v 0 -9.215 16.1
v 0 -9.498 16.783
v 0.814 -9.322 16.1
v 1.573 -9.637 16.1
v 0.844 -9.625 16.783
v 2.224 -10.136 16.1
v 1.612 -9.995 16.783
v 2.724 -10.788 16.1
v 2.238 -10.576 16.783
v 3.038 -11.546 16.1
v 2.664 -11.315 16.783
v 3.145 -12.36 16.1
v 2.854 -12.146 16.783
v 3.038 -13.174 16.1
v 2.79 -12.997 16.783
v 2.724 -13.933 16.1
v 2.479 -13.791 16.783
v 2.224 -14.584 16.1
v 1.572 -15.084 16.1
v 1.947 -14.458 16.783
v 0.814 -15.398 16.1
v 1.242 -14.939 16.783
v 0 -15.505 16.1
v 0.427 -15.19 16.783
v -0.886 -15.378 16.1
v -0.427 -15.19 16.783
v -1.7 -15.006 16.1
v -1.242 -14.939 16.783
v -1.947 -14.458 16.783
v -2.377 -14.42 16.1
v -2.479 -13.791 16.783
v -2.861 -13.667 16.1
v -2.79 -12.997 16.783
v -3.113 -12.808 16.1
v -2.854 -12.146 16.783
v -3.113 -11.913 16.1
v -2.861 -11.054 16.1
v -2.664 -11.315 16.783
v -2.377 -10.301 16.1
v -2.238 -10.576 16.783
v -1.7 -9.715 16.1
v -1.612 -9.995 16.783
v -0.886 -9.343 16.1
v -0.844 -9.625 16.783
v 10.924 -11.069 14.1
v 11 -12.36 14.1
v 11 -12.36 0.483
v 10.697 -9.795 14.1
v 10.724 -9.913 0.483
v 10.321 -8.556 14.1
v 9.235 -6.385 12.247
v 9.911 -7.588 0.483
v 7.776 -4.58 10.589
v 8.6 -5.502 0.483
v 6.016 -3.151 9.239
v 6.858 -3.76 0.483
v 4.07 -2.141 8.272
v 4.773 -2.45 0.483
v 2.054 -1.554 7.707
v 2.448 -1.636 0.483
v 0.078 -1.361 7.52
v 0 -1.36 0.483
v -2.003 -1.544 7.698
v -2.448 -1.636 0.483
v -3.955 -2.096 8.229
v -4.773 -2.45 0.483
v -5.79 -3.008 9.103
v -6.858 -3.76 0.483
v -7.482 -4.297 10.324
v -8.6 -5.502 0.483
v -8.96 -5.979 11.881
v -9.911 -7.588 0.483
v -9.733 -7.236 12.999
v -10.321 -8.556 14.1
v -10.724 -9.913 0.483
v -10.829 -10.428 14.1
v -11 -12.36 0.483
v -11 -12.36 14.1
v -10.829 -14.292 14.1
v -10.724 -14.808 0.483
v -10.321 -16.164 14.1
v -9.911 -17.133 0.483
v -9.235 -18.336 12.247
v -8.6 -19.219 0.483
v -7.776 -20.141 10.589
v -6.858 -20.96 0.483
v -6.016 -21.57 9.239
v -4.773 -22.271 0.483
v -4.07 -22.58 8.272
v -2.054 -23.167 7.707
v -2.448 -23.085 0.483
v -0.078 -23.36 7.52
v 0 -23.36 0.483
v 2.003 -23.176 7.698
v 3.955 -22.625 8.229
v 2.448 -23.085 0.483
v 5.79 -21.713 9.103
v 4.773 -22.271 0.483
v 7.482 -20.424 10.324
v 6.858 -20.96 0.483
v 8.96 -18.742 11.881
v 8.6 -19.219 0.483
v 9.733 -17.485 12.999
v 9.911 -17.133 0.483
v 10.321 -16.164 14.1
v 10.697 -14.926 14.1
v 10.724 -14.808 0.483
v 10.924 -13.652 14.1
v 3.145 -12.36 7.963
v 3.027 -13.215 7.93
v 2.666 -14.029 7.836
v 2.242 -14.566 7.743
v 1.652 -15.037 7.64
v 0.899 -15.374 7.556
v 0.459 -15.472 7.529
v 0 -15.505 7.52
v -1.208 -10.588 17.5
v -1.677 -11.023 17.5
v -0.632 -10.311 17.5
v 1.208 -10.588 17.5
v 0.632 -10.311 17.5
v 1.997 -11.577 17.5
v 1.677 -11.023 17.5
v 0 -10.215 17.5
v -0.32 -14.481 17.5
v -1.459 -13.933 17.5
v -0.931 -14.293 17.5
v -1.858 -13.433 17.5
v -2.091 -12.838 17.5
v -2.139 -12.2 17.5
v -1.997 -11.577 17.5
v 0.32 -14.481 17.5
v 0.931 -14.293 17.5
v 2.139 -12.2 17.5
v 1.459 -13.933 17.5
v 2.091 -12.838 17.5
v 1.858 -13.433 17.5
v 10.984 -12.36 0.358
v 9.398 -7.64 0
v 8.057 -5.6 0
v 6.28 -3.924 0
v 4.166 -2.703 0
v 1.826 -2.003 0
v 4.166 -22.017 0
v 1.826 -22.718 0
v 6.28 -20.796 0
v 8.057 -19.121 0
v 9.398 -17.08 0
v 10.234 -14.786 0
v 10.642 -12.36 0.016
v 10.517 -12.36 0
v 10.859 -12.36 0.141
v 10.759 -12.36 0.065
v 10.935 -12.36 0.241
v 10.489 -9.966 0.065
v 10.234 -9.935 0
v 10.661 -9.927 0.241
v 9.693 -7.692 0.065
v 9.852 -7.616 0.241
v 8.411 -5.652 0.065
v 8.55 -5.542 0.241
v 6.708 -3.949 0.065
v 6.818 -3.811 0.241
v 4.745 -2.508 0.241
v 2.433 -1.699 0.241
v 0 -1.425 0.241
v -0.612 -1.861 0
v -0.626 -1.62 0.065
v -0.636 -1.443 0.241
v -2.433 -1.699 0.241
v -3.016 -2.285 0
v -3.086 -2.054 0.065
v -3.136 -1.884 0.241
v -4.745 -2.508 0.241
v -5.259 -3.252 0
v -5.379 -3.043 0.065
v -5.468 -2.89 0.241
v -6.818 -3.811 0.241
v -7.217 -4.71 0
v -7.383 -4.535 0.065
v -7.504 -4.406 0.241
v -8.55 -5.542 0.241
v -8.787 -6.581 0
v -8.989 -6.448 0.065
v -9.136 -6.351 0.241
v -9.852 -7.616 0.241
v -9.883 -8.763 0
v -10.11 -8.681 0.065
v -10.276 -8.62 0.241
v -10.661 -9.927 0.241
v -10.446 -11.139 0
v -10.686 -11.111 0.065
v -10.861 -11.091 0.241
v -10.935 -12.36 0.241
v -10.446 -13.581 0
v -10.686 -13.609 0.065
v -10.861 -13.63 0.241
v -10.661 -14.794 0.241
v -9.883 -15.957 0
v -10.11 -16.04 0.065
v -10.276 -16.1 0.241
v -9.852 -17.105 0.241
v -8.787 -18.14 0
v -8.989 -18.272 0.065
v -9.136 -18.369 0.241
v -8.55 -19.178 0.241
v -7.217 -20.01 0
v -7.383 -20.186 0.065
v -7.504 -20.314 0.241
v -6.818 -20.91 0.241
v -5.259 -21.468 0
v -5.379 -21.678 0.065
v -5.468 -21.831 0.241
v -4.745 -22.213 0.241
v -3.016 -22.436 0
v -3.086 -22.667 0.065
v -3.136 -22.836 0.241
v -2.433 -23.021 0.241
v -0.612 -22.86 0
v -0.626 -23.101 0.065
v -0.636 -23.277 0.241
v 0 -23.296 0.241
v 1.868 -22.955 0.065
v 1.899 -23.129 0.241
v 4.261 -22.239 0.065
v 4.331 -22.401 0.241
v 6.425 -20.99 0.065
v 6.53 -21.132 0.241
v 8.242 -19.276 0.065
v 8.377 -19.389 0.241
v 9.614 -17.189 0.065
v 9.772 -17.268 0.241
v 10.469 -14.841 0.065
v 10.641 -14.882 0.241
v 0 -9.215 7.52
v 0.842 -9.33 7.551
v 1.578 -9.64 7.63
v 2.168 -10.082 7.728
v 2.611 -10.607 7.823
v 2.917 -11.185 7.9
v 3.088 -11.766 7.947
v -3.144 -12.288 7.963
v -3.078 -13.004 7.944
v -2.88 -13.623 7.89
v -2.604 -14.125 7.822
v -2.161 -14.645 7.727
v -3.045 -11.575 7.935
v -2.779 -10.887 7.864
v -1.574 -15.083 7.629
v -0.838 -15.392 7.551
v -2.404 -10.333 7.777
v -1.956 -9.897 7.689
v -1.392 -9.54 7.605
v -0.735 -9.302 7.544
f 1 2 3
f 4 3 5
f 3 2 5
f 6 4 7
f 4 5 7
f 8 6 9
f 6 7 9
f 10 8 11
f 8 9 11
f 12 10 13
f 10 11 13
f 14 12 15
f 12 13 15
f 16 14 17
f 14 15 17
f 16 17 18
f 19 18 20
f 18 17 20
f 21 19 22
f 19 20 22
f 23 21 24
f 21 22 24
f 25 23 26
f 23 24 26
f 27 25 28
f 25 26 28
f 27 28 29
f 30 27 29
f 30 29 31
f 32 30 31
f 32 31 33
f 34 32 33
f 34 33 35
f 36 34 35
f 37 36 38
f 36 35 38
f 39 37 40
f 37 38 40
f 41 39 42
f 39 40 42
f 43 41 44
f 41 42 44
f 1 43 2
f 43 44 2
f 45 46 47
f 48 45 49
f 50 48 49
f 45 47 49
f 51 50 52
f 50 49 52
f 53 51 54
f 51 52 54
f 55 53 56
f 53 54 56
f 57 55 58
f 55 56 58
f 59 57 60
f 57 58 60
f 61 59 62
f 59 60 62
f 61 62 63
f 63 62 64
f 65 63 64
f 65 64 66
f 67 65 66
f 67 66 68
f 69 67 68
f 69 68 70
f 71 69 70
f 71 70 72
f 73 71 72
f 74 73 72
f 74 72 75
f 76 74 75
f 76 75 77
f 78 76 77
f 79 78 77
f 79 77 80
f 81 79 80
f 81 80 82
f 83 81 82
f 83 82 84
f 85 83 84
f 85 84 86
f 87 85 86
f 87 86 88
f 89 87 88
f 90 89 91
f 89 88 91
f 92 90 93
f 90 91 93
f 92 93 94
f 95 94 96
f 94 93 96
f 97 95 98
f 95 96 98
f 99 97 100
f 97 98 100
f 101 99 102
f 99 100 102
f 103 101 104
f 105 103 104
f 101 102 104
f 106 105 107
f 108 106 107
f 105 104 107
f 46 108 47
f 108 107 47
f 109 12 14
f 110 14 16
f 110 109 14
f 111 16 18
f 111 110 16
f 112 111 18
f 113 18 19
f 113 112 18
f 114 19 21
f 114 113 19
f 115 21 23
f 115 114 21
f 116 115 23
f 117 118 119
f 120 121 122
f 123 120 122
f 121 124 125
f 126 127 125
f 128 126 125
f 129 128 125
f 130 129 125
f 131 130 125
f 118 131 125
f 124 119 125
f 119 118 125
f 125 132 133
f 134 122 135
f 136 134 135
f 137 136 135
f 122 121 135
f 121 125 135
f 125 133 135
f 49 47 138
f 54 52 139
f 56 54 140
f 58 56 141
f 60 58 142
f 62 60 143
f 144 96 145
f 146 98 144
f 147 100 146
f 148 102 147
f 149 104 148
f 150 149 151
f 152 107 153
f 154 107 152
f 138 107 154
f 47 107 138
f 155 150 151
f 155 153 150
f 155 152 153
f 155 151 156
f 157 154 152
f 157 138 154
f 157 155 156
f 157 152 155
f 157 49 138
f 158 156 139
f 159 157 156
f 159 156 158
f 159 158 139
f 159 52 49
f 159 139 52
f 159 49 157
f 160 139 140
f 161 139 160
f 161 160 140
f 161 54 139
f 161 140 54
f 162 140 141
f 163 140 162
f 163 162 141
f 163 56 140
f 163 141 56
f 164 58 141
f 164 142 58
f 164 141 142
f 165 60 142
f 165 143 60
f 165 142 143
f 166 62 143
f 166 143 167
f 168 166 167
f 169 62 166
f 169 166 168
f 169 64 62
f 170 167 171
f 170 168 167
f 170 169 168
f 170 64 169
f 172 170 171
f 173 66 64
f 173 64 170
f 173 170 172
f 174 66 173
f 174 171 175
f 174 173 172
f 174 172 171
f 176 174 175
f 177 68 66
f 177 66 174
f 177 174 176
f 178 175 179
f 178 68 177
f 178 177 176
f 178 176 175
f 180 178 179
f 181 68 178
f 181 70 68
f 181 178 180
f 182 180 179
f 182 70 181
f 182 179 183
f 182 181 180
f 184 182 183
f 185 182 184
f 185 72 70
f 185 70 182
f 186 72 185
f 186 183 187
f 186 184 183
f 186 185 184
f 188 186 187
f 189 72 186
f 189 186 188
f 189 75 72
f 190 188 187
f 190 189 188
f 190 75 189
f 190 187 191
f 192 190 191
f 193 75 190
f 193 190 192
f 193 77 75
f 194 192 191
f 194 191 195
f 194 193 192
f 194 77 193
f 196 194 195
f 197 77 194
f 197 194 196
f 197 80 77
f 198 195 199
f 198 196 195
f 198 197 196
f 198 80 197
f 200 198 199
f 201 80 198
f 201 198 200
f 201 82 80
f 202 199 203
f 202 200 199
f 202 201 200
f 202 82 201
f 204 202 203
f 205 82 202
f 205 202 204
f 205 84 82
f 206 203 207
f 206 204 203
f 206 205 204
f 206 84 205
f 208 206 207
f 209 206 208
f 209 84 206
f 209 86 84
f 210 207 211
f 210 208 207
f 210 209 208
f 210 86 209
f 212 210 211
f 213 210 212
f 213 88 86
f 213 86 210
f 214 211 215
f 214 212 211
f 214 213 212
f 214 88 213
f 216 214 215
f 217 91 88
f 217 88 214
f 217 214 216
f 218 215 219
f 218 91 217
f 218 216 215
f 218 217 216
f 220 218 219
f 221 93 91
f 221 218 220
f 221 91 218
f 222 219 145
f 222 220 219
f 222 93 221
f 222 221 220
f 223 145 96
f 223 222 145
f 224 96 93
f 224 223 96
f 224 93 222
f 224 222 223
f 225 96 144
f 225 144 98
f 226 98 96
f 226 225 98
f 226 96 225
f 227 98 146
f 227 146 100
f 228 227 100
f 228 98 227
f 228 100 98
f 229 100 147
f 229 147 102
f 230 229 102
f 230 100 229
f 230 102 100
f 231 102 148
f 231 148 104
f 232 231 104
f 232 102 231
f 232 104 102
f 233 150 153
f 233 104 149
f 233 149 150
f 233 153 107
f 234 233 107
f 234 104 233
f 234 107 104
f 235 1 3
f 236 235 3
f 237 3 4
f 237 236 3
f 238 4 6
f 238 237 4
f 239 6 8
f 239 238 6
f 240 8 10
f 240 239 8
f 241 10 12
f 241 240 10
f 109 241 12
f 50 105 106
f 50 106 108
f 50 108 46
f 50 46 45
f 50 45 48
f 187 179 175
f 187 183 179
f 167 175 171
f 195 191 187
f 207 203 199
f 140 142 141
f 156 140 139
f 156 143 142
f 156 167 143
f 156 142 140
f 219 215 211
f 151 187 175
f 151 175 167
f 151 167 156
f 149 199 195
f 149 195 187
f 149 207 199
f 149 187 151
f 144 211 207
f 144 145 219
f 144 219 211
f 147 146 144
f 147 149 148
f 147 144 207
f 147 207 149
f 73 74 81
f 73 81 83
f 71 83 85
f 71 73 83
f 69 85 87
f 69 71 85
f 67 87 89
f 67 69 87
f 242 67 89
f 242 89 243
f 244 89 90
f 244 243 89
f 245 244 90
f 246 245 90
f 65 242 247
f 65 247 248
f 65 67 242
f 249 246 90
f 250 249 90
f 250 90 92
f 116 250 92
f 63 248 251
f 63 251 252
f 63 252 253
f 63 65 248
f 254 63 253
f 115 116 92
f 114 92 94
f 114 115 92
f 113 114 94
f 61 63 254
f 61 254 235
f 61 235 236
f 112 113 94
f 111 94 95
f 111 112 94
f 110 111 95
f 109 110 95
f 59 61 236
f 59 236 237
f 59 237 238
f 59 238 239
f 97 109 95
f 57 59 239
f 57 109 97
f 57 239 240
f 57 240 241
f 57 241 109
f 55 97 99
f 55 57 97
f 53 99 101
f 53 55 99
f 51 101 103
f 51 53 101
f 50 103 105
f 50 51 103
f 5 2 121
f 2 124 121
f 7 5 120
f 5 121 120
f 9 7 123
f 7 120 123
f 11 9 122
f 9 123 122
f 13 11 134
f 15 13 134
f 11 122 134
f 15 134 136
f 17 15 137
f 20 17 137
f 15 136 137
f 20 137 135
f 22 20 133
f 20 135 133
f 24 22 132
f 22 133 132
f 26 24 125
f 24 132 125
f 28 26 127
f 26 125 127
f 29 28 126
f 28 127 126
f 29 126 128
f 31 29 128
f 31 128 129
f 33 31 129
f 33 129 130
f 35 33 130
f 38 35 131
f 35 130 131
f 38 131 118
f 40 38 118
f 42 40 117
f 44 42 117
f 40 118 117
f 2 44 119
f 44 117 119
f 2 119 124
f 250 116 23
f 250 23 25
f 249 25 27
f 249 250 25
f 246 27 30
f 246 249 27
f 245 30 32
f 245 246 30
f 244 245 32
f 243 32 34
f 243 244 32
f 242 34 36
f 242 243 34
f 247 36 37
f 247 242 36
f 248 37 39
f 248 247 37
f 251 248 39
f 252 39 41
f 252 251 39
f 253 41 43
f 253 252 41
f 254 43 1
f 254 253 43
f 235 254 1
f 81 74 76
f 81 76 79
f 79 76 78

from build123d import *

# Parameters (mm, degrees)
F0_R     = 11
F1_DEPTH = 14.1
F2_R     = 11.385
F3_DEPTH = 28.4
F5_DEPTH = 17.5
F7_R     = 0.4828427125


# Not quite as in the source:
# - a fillet or chamfer that OpenCascade refuses, or shapes differently, is made with other operations: its cross-section is extruded or revolved along the edge and cut away or added


with BuildPart() as f1:
    # F0 (on Top) → F1 (new body)
    with BuildSketch(Plane.XY):
        with Locations((0, -12.3603016903)):
            Circle(F0_R)
    extrude(amount=F1_DEPTH)

    # F2 (on Front) → F3 (cut)
    with BuildSketch(Plane.XZ):
        with Locations((0, 18.905)):
            Circle(F2_R)
    extrude(amount=F3_DEPTH, mode=Mode.SUBTRACT)

    # F4 (on face) → F5 (join)
    with BuildSketch(Plane(origin=(0, 0, 0), x_dir=(1, 0, 0), z_dir=(0, 0, -1))):
        with BuildLine():
            ThreePointArc((0, 15.5053016903), (-3.145, 12.3603016903), (0, 9.2153016903))
            Line((0, 9.2153016903), (0, 15.5053016903))
        make_face()
        with BuildLine():
            Line((0, 15.5053016903), (0, 9.2153016903))
            ThreePointArc((0, 9.2153016903), (2.2238508268, 10.1364508634), (3.145, 12.3603016903))
            ThreePointArc((3.145, 12.3603016903), (2.2238508268, 14.5841525171), (0, 15.5053016903))
        make_face()
    extrude(amount=-F5_DEPTH)

    # F6: chamfer of 1 on 1 edges, made by hand

    # F6_s1 → F6_t2 (revolve, cut)
    with BuildSketch(Plane.YZ):
        Polygon((-9.2153016903, 16.5), (-10.2153016903, 17.5), (-9.2153016903, 17.5), align=None)
    revolve(axis=Axis((0, -12.3603016903, 17.5), (0, 0, -1)), mode=Mode.SUBTRACT)

    # F7
    f7_edges = [f1.edges().sort_by_distance(p)[0] for p in [
        (-11, -12.360302, 0),
    ]]
    fillet(f7_edges, radius=F7_R)

    # F8: chamfer of 0.4 on 1 edges, made by hand

    # F8_s1 → F8_t2 (revolve, cut)
    with BuildSketch(Plane.YZ):
        Polygon((-9.2153016903, 16.1), (-9.4981444028, 16.7828427125), (-9.2153016903, 16.5), align=None)
    revolve(axis=Axis((0, -12.3603016903, 16.5), (0, 0, -1)), mode=Mode.SUBTRACT)


solid = f1.part
